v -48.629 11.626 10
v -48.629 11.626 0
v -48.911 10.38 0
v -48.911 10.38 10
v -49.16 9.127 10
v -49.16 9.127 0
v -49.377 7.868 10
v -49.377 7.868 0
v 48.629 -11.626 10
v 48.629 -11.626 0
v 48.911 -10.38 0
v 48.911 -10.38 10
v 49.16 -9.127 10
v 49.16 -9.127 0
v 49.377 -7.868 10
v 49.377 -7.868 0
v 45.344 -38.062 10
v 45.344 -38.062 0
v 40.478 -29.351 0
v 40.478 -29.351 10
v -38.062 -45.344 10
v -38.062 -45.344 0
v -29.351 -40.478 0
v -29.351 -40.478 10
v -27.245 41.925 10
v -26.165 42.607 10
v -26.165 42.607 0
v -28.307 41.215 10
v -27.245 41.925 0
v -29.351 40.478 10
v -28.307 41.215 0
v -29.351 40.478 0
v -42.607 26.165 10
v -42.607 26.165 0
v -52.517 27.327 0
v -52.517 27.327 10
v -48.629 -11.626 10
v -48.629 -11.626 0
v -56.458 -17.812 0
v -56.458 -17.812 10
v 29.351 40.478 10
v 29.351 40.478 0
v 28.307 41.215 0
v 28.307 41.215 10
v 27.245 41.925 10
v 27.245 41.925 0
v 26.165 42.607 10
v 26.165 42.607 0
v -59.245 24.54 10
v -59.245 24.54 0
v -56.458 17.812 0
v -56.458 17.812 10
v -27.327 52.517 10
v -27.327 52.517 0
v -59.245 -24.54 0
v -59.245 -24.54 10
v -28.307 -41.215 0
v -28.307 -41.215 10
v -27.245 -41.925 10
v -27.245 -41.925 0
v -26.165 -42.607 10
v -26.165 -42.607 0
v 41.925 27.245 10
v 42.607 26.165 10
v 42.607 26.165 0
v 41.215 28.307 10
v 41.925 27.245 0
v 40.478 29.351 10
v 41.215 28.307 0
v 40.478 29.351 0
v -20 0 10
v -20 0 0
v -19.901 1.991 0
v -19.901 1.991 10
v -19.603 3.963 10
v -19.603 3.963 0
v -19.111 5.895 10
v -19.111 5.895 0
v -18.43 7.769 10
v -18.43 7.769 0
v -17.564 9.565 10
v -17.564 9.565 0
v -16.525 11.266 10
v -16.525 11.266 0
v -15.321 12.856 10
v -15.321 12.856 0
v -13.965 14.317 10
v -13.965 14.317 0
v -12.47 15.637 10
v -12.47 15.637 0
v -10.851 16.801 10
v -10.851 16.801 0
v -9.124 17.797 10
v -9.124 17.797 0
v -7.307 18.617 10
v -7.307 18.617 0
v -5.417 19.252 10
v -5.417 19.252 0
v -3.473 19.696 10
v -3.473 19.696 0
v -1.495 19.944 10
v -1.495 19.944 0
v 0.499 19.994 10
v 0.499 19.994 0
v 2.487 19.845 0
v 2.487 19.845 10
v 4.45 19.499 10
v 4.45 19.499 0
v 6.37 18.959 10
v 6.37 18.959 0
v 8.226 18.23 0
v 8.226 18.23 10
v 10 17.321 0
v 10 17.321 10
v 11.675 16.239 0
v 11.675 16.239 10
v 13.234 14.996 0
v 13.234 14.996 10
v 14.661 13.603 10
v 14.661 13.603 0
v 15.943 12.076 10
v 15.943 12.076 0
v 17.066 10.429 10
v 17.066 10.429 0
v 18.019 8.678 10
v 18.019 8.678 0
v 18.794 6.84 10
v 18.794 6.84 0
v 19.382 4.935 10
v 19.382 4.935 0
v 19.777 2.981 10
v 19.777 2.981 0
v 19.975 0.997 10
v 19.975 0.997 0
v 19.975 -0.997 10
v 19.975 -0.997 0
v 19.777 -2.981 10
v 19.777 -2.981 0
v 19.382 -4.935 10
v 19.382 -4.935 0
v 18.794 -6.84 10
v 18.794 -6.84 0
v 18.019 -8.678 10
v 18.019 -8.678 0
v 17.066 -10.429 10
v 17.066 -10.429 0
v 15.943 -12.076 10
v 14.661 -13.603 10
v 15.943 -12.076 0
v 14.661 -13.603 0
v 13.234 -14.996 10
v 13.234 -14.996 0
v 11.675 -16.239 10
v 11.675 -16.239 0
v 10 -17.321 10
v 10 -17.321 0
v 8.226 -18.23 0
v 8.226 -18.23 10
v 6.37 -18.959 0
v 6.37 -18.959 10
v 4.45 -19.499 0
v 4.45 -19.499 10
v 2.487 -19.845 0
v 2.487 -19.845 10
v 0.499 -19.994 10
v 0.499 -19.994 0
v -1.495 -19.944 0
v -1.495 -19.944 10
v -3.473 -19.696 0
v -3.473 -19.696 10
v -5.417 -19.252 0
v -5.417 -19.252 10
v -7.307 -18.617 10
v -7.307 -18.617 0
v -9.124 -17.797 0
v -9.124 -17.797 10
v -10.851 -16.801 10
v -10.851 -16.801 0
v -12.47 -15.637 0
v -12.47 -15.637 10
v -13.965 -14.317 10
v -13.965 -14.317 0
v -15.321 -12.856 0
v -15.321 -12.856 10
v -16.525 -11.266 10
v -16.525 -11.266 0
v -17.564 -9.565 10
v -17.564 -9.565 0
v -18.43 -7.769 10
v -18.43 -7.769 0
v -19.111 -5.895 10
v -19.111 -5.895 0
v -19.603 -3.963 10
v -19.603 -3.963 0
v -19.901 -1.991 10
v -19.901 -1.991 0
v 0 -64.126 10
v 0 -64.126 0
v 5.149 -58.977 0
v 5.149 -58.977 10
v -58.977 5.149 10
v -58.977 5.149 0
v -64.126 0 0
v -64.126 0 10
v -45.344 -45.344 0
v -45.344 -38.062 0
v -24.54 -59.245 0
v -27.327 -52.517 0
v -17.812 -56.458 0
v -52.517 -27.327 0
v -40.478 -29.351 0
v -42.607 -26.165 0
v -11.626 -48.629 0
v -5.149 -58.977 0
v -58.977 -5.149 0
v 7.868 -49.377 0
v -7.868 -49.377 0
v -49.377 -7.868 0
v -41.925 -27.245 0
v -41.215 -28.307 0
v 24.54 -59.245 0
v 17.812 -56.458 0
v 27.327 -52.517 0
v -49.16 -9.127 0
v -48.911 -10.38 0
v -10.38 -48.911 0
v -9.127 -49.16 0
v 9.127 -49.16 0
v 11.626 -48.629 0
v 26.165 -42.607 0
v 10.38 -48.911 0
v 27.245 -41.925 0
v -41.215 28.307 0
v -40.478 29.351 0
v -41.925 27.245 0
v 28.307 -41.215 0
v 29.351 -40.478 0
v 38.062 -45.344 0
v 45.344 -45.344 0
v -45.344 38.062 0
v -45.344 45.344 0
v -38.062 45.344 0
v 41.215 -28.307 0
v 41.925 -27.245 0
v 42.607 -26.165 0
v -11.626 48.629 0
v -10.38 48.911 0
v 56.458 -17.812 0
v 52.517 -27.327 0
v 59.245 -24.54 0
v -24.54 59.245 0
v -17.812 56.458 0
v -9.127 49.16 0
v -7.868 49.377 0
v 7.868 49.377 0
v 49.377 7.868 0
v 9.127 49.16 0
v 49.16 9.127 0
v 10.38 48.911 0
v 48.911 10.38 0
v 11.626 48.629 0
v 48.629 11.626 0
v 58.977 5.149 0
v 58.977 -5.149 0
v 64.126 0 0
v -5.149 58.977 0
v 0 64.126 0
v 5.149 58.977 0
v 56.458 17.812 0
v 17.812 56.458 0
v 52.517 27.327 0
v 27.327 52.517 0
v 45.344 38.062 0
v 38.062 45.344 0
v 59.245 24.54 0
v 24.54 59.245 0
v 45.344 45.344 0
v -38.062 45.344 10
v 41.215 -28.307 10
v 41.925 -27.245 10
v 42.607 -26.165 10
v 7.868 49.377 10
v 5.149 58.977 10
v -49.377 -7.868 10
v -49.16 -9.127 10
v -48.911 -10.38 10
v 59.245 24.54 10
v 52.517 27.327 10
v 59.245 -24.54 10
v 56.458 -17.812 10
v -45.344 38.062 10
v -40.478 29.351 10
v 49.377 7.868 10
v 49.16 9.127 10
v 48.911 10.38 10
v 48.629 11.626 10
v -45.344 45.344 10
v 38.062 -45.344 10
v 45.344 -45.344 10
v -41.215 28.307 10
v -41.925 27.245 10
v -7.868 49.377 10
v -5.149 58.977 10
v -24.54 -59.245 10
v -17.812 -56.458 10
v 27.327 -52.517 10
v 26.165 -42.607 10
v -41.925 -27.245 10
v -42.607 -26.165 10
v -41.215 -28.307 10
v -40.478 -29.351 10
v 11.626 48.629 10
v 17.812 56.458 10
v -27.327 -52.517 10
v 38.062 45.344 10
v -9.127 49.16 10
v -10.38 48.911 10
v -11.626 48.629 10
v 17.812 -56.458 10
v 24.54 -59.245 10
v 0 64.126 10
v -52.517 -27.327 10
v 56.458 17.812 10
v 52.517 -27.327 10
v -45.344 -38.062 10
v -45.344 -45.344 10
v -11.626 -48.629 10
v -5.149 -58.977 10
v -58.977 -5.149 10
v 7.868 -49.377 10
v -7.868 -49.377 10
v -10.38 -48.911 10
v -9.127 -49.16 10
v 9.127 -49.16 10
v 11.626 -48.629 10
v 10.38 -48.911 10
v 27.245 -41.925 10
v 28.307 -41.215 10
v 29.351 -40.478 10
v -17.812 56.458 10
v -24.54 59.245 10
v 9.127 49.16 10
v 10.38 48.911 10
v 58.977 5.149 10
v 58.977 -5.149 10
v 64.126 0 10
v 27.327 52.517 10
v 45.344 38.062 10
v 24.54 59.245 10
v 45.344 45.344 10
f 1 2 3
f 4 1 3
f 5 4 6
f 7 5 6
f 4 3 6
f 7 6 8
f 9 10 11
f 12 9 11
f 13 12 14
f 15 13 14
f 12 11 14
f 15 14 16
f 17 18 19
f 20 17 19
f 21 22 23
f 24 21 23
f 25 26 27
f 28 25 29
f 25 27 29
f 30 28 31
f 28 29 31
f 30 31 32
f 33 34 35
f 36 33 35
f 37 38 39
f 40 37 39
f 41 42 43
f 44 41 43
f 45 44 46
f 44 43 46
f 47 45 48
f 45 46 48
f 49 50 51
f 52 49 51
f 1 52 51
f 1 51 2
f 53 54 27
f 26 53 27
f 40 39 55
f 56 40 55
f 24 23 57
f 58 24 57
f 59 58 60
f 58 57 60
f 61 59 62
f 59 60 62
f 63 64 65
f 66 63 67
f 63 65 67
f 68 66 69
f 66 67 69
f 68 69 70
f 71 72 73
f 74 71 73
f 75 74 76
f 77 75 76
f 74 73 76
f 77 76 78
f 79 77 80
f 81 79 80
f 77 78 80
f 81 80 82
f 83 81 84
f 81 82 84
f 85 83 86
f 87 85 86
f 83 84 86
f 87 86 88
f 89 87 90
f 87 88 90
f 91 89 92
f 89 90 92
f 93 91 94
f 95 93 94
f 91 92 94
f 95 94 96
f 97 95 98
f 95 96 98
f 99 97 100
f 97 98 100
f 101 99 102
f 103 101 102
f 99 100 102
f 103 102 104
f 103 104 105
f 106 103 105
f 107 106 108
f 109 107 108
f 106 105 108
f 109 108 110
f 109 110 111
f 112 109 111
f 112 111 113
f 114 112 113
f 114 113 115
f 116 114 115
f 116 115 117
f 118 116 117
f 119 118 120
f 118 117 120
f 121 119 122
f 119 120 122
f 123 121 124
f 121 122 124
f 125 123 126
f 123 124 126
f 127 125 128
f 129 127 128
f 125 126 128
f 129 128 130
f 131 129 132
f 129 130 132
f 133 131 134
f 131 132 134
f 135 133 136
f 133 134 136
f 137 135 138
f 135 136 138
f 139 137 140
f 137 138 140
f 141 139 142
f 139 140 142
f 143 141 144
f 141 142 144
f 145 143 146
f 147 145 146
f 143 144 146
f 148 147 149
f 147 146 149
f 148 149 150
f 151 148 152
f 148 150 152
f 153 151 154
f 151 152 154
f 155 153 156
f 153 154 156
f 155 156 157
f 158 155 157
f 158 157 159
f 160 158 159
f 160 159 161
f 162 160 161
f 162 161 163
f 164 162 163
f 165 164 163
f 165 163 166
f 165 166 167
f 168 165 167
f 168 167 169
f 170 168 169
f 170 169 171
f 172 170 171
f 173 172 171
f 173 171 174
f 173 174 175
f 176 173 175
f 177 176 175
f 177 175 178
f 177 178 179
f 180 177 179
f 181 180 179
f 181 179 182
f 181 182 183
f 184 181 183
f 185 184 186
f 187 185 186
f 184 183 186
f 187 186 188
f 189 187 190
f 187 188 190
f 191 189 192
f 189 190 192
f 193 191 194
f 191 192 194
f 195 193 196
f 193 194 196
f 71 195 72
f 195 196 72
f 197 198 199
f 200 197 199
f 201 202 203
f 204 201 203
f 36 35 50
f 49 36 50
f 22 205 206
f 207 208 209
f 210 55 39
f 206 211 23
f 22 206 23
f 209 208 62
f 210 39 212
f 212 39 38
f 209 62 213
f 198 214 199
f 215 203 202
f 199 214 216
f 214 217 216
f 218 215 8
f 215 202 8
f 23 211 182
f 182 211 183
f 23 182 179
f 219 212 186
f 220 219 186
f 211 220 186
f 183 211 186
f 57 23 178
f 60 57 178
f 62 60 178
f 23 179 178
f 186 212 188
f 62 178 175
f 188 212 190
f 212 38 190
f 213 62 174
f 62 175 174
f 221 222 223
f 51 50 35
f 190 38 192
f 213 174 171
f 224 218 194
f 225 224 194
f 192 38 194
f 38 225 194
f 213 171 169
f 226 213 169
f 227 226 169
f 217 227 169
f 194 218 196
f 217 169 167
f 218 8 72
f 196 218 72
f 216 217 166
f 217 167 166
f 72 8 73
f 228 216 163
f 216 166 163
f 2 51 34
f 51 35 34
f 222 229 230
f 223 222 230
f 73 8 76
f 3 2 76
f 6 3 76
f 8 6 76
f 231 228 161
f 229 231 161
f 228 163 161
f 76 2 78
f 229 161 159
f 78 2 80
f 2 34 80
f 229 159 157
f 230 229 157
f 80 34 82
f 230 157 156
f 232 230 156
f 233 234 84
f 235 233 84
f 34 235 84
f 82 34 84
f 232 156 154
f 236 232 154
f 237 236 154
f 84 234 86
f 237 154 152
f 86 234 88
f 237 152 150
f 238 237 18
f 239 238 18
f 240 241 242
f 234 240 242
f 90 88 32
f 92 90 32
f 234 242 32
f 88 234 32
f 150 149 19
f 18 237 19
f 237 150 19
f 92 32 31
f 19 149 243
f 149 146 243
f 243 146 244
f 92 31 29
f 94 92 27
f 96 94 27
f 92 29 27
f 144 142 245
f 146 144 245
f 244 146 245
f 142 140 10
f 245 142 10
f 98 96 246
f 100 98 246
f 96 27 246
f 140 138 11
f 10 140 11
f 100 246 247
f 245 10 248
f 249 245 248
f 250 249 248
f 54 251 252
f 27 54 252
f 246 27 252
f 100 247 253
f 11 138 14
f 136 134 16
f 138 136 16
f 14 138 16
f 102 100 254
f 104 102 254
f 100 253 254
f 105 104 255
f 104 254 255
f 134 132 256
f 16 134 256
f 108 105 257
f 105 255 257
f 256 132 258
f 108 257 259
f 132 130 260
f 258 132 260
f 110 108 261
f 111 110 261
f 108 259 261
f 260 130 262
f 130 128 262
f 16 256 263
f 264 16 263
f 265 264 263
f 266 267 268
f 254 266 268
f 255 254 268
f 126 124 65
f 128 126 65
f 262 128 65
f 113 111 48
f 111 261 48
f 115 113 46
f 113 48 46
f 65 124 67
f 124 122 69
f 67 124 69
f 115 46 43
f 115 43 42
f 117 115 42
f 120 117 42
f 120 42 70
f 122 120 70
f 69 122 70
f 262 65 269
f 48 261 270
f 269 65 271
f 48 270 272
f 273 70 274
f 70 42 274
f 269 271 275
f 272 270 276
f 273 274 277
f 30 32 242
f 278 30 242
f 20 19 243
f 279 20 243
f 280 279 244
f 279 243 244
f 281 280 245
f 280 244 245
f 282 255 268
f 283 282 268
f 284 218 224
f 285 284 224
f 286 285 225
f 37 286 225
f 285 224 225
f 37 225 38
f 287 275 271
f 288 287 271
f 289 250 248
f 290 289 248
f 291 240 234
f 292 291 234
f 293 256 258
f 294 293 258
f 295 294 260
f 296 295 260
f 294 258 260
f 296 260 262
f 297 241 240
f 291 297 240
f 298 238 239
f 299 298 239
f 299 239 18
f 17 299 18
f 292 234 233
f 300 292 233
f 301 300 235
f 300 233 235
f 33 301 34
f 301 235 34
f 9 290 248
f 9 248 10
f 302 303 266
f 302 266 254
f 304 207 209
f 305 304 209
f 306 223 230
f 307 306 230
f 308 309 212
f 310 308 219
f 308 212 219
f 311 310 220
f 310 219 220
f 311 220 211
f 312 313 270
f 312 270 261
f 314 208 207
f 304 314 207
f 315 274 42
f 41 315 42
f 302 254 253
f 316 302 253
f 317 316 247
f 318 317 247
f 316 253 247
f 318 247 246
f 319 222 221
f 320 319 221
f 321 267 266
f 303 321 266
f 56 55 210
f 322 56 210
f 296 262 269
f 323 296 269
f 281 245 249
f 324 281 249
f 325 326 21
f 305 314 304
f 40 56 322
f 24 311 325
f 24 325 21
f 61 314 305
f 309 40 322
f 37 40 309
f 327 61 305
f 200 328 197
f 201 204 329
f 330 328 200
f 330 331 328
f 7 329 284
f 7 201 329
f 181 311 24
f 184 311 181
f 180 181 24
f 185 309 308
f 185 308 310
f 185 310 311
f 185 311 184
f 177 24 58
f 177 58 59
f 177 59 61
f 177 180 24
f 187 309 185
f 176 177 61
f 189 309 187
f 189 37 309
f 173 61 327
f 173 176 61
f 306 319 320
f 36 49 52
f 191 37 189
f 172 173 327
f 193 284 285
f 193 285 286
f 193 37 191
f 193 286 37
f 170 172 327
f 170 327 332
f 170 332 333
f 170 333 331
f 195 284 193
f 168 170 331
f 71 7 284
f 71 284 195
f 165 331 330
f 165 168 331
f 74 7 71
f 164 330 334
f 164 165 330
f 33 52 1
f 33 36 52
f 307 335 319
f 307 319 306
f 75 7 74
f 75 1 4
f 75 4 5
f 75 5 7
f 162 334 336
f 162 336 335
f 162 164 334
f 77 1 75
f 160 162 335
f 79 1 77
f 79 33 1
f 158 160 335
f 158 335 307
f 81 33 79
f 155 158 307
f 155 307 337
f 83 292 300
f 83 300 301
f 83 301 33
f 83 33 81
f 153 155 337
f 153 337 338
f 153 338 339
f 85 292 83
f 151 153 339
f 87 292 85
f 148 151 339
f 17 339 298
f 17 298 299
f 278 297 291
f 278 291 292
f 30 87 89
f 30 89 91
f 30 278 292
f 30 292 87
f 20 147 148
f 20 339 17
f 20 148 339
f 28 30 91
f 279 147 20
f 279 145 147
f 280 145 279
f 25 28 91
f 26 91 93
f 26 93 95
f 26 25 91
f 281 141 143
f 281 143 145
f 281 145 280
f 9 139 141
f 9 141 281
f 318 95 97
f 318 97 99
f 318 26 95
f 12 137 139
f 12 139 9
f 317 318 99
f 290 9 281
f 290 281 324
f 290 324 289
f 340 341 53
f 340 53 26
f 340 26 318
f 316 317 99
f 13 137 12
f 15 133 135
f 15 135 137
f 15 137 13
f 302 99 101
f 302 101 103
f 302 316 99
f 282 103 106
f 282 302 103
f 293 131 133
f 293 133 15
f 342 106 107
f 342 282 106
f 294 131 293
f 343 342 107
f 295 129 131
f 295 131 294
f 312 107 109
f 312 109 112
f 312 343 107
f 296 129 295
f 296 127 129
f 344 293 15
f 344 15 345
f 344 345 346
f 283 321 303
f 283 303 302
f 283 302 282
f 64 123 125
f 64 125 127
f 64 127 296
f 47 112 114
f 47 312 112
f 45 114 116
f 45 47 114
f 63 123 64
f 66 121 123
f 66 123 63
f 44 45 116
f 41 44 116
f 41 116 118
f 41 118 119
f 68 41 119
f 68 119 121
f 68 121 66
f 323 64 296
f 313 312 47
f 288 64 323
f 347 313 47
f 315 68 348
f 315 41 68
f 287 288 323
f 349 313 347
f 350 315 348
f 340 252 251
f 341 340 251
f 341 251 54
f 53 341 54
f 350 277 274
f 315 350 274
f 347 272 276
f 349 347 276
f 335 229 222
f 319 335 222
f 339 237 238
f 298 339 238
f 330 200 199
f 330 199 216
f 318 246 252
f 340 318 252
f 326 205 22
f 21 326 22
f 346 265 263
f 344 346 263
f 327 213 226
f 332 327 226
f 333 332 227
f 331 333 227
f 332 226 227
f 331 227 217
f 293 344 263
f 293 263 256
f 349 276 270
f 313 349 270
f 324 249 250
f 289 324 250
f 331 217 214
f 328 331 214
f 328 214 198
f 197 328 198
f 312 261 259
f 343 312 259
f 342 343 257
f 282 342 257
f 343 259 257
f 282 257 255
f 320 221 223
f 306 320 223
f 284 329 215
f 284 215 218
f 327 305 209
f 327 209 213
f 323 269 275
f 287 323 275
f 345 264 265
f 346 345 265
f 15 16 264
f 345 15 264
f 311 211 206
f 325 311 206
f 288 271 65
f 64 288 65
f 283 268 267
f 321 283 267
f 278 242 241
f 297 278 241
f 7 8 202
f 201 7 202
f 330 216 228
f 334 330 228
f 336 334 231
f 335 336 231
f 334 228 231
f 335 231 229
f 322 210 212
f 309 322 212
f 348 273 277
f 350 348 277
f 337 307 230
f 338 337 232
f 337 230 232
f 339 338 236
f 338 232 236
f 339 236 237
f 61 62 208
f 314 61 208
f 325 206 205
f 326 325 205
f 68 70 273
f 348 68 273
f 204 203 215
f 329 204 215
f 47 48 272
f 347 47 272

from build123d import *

# Parameters (mm, degrees)
BOSS_EXTRUDE2_DEPTH = 10
SKETCH2_R           = 20
CUT_EXTRUDE1_DEPTH  = 10


with BuildPart() as part:
    # Sketch1 → Boss-Extrude2 (new body)
    with BuildSketch(Plane.XY):
        with BuildLine():
            Line((17.811997012, 56.458001404), (11.62649389, 48.629462673))
            ThreePointArc((11.62649389, 48.629462673), (9.754516101, 49.03926402), (7.86820995, 49.377031828))
            Line((7.86820995, 49.377031828), (5.14940229, 58.976748098))
            Line((5.14940229, 58.976748098), (0, 64.126150387))
            Line((0, 64.126150387), (-5.14940229, 58.976748098))
            Line((-5.14940229, 58.976748098), (-7.86820995, 49.377031828))
            ThreePointArc((-7.86820995, 49.377031828), (-9.754516101, 49.03926402), (-11.62649389, 48.629462673))
            Line((-11.62649389, 48.629462673), (-17.811997012, 56.458001404))
            Line((-17.811997012, 56.458001404), (-24.540015335, 59.244837841))
            Line((-24.540015335, 59.244837841), (-27.326851772, 52.516819519))
            Line((-27.326851772, 52.516819519), (-26.16505015, 42.607395492))
            ThreePointArc((-26.16505015, 42.607395492), (-27.778511651, 41.573480615), (-29.351169429, 40.478498652))
            Line((-29.351169429, 40.478498652), (-38.061681234, 45.34403579))
            Line((-38.061681234, 45.34403579), (-45.34403579, 45.34403579))
            Line((-45.34403579, 45.34403579), (-45.34403579, 38.061681234))
            Line((-45.34403579, 38.061681234), (-40.478498652, 29.351169429))
            ThreePointArc((-40.478498652, 29.351169429), (-41.573480615, 27.778511651), (-42.607395492, 26.16505015))
            Line((-42.607395492, 26.16505015), (-52.516819519, 27.326851772))
            Line((-52.516819519, 27.326851772), (-59.244837841, 24.540015335))
            Line((-59.244837841, 24.540015335), (-56.458001404, 17.811997012))
            Line((-56.458001404, 17.811997012), (-48.629462673, 11.62649389))
            ThreePointArc((-48.629462673, 11.62649389), (-49.03926402, 9.754516101), (-49.377031828, 7.86820995))
            Line((-49.377031828, 7.86820995), (-58.976748098, 5.14940229))
            Line((-58.976748098, 5.14940229), (-64.126150387, 0))
            Line((-64.126150387, 0), (-58.976748098, -5.14940229))
            Line((-58.976748098, -5.14940229), (-49.377031828, -7.86820995))
            ThreePointArc((-49.377031828, -7.86820995), (-49.03926402, -9.754516101), (-48.629462673, -11.62649389))
            Line((-48.629462673, -11.62649389), (-56.458001404, -17.811997012))
            Line((-56.458001404, -17.811997012), (-59.244837841, -24.540015335))
            Line((-59.244837841, -24.540015335), (-52.516819519, -27.326851772))
            Line((-52.516819519, -27.326851772), (-42.607395492, -26.16505015))
            ThreePointArc((-42.607395492, -26.16505015), (-41.573480615, -27.778511651), (-40.478498652, -29.351169429))
            Line((-40.478498652, -29.351169429), (-45.34403579, -38.061681234))
            Line((-45.34403579, -38.061681234), (-45.34403579, -45.34403579))
            Line((-45.34403579, -45.34403579), (-38.061681234, -45.34403579))
            Line((-38.061681234, -45.34403579), (-29.351169429, -40.478498652))
            ThreePointArc((-29.351169429, -40.478498652), (-27.778511651, -41.573480615), (-26.16505015, -42.607395492))
            Line((-26.16505015, -42.607395492), (-27.326851772, -52.516819519))
            Line((-27.326851772, -52.516819519), (-24.540015335, -59.244837841))
            Line((-24.540015335, -59.244837841), (-17.811997012, -56.458001404))
            Line((-17.811997012, -56.458001404), (-11.62649389, -48.629462673))
            ThreePointArc((-11.62649389, -48.629462673), (-9.754516101, -49.03926402), (-7.86820995, -49.377031828))
            Line((-7.86820995, -49.377031828), (-5.14940229, -58.976748098))
            Line((-5.14940229, -58.976748098), (0, -64.126150387))
            Line((0, -64.126150387), (5.14940229, -58.976748098))
            Line((5.14940229, -58.976748098), (7.86820995, -49.377031828))
            ThreePointArc((7.86820995, -49.377031828), (9.754516101, -49.03926402), (11.62649389, -48.629462673))
            Line((11.62649389, -48.629462673), (17.811997012, -56.458001404))
            Line((17.811997012, -56.458001404), (24.540015335, -59.244837841))
            Line((24.540015335, -59.244837841), (27.326851772, -52.516819519))
            Line((27.326851772, -52.516819519), (26.16505015, -42.607395492))
            ThreePointArc((26.16505015, -42.607395492), (27.778511651, -41.573480615), (29.351169429, -40.478498652))
            Line((29.351169429, -40.478498652), (38.061681234, -45.34403579))
            Line((38.061681234, -45.34403579), (45.34403579, -45.34403579))
            Line((45.34403579, -45.34403579), (45.34403579, -38.061681234))
            Line((45.34403579, -38.061681234), (40.478498652, -29.351169429))
            ThreePointArc((40.478498652, -29.351169429), (41.573480615, -27.778511651), (42.607395492, -26.16505015))
            Line((42.607395492, -26.16505015), (52.516819519, -27.326851772))
            Line((52.516819519, -27.326851772), (59.244837841, -24.540015335))
            Line((59.244837841, -24.540015335), (56.458001404, -17.811997012))
            Line((56.458001404, -17.811997012), (48.629462673, -11.62649389))
            ThreePointArc((48.629462673, -11.62649389), (49.03926402, -9.754516101), (49.377031828, -7.86820995))
            Line((49.377031828, -7.86820995), (58.976748098, -5.14940229))
            Line((58.976748098, -5.14940229), (64.126150387, 0))
            Line((64.126150387, 0), (58.976748098, 5.14940229))
            Line((58.976748098, 5.14940229), (49.377031828, 7.86820995))
            ThreePointArc((49.377031828, 7.86820995), (49.03926402, 9.754516101), (48.629462673, 11.62649389))
            Line((48.629462673, 11.62649389), (56.458001404, 17.811997012))
            Line((56.458001404, 17.811997012), (59.244837841, 24.540015335))
            Line((59.244837841, 24.540015335), (52.516819519, 27.326851772))
            Line((52.516819519, 27.326851772), (42.607395492, 26.16505015))
            ThreePointArc((42.607395492, 26.16505015), (41.573480615, 27.778511651), (40.478498652, 29.351169429))
            Line((40.478498652, 29.351169429), (45.34403579, 38.061681234))
            Line((45.34403579, 38.061681234), (45.34403579, 45.34403579))
            Line((45.34403579, 45.34403579), (38.061681234, 45.34403579))
            Line((38.061681234, 45.34403579), (29.351169429, 40.478498652))
            ThreePointArc((29.351169429, 40.478498652), (27.778511651, 41.573480615), (26.16505015, 42.607395492))
            Line((26.16505015, 42.607395492), (27.326851772, 52.516819519))
            Line((27.326851772, 52.516819519), (24.540015335, 59.244837841))
            Line((24.540015335, 59.244837841), (17.811997012, 56.458001404))
        make_face()
    extrude(amount=BOSS_EXTRUDE2_DEPTH)

    # Sketch2 → Cut-Extrude1 (cut)
    with BuildSketch(Plane(origin=(0, 0, 0), x_dir=(-1, 0, 0), z_dir=(0, 0, -1))):
        Circle(SKETCH2_R)
    extrude(amount=-CUT_EXTRUDE1_DEPTH, mode=Mode.SUBTRACT)


solid = part.part
